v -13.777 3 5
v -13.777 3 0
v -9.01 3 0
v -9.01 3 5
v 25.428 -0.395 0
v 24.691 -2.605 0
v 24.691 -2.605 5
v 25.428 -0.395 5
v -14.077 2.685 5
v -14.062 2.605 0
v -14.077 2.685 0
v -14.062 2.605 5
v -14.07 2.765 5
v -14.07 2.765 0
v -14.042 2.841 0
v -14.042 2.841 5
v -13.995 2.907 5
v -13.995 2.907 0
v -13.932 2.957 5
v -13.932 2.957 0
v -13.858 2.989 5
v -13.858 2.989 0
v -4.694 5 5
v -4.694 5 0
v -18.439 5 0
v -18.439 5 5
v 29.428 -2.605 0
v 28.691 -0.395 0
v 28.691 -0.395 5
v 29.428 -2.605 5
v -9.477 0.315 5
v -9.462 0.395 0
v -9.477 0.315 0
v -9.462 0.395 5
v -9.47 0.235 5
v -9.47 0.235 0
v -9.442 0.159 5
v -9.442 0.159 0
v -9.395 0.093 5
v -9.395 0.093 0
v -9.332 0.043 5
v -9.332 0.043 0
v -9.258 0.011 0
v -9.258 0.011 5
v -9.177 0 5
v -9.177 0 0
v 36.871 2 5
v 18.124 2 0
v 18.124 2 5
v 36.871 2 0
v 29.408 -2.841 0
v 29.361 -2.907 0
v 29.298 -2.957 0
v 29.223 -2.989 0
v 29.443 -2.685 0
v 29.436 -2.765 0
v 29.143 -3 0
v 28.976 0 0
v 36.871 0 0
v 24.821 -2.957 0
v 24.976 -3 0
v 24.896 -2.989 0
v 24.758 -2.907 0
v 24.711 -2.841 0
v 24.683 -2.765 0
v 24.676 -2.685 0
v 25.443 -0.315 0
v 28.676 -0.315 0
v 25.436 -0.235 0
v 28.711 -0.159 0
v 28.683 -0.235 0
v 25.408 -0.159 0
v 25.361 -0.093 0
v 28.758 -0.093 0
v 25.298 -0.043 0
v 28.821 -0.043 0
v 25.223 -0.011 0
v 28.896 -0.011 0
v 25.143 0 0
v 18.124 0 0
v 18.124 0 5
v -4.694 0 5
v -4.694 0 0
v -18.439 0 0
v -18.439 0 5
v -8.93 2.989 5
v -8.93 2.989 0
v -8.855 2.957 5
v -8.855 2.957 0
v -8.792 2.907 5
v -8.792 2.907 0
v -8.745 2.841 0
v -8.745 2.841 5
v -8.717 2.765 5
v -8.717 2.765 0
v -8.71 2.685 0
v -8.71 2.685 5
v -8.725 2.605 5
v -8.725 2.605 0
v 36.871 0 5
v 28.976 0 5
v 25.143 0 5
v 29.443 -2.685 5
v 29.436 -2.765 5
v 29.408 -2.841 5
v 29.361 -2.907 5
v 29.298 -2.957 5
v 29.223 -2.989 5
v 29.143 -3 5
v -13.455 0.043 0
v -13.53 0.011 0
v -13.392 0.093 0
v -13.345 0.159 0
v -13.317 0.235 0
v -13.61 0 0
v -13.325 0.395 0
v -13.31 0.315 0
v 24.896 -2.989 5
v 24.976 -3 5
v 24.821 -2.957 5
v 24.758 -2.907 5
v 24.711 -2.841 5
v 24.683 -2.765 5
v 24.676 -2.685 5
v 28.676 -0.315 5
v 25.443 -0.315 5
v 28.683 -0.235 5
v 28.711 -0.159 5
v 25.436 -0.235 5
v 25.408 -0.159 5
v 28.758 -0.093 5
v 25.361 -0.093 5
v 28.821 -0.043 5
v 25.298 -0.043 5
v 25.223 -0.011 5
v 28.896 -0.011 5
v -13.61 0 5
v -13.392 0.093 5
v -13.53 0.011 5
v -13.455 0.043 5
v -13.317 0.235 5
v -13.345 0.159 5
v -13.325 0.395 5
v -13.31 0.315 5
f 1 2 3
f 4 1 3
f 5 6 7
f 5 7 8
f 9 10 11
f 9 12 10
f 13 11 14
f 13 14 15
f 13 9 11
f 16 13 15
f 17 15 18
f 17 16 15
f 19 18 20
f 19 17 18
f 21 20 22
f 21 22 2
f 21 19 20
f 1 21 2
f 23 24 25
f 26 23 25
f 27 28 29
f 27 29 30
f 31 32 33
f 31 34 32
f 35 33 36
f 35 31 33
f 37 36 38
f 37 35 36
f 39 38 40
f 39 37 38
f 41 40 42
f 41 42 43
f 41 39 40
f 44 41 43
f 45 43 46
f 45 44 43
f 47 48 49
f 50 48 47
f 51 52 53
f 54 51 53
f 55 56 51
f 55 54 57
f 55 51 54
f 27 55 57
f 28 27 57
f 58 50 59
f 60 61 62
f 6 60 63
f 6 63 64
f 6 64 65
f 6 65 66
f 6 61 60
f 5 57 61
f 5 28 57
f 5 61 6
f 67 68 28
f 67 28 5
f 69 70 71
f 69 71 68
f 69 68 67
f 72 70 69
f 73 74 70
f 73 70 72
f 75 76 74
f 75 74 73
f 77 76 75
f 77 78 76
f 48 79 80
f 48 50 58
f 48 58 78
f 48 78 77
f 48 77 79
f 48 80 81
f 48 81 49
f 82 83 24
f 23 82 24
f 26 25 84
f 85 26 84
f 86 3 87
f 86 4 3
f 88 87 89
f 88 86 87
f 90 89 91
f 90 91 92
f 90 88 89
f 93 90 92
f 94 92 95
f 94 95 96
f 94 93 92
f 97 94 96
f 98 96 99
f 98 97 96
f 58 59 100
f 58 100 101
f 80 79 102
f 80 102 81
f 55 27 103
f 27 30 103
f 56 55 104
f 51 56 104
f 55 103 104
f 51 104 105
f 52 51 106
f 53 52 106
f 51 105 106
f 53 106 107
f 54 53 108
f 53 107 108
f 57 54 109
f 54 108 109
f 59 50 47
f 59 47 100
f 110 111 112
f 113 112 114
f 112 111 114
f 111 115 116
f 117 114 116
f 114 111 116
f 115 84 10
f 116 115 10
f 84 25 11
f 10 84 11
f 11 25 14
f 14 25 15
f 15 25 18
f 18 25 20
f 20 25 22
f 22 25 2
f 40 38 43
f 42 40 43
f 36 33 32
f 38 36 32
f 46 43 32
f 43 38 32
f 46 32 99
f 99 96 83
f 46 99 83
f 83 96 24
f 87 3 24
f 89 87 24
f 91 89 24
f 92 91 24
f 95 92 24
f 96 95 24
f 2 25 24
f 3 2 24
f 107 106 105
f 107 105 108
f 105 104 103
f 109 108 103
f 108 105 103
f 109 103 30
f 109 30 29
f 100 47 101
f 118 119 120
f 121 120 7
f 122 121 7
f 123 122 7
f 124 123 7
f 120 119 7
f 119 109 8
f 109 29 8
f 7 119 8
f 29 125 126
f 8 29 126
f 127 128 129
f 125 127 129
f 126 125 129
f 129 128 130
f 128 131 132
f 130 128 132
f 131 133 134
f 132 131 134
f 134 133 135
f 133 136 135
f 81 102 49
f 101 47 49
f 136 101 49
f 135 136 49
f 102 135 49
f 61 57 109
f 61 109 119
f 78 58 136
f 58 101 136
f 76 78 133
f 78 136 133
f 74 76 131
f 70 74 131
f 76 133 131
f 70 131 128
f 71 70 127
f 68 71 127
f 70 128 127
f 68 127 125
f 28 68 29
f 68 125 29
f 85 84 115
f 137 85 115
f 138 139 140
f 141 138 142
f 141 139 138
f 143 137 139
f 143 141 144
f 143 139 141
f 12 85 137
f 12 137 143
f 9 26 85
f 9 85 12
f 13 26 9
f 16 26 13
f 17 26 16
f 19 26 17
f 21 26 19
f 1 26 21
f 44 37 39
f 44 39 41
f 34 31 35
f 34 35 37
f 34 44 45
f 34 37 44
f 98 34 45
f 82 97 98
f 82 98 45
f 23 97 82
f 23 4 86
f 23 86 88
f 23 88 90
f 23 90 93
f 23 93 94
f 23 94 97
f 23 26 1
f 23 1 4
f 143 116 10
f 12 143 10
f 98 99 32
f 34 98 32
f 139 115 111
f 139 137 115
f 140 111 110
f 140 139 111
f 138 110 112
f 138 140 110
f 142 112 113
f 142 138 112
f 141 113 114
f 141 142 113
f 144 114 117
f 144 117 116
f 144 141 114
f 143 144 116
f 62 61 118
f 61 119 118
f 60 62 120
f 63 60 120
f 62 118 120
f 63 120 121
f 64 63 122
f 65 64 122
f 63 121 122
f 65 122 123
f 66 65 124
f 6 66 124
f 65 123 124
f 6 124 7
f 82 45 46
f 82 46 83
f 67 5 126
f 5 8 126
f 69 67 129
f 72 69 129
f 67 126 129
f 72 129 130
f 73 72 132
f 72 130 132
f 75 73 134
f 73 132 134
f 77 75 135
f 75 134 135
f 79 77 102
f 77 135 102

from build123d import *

# Parameters (mm, degrees)
PAD_DEPTH = 5
FILLET_R  = 0.3


with BuildPart() as part:
    # Sketch → Pad (new body)
    with BuildSketch(Plane.XY):
        Polygon((18.123922, 2), (36.870991, 2), (36.870991, 0), (28.559592, 0), (29.559592, -3), (24.559592, -3), (25.559592, 0), (18.123922, 0), align=None)
        Polygon((-18.439316, 0), (-13.193694, 0), (-14.193694, 3), (-8.593694, 3), (-9.593694, 0), (-4.694093, 0), (-4.694093, 5), (-18.439316, 5), align=None)
    extrude(amount=PAD_DEPTH)

    # Fillet
    fillet_edges = [part.edges().sort_by_distance(p)[0] for p in [
        (-13.193694, 0, 2.5),
        (29.559592, -3, 2.5),
        (-14.193694, 3, 2.5),
        (28.559592, 0, 2.5),
        (-8.593694, 3, 2.5),
        (-9.593694, 0, 2.5),
        (25.559592, 0, 2.5),
        (24.559592, -3, 2.5),
    ]]
    fillet(fillet_edges, radius=FILLET_R)


solid = part.part
